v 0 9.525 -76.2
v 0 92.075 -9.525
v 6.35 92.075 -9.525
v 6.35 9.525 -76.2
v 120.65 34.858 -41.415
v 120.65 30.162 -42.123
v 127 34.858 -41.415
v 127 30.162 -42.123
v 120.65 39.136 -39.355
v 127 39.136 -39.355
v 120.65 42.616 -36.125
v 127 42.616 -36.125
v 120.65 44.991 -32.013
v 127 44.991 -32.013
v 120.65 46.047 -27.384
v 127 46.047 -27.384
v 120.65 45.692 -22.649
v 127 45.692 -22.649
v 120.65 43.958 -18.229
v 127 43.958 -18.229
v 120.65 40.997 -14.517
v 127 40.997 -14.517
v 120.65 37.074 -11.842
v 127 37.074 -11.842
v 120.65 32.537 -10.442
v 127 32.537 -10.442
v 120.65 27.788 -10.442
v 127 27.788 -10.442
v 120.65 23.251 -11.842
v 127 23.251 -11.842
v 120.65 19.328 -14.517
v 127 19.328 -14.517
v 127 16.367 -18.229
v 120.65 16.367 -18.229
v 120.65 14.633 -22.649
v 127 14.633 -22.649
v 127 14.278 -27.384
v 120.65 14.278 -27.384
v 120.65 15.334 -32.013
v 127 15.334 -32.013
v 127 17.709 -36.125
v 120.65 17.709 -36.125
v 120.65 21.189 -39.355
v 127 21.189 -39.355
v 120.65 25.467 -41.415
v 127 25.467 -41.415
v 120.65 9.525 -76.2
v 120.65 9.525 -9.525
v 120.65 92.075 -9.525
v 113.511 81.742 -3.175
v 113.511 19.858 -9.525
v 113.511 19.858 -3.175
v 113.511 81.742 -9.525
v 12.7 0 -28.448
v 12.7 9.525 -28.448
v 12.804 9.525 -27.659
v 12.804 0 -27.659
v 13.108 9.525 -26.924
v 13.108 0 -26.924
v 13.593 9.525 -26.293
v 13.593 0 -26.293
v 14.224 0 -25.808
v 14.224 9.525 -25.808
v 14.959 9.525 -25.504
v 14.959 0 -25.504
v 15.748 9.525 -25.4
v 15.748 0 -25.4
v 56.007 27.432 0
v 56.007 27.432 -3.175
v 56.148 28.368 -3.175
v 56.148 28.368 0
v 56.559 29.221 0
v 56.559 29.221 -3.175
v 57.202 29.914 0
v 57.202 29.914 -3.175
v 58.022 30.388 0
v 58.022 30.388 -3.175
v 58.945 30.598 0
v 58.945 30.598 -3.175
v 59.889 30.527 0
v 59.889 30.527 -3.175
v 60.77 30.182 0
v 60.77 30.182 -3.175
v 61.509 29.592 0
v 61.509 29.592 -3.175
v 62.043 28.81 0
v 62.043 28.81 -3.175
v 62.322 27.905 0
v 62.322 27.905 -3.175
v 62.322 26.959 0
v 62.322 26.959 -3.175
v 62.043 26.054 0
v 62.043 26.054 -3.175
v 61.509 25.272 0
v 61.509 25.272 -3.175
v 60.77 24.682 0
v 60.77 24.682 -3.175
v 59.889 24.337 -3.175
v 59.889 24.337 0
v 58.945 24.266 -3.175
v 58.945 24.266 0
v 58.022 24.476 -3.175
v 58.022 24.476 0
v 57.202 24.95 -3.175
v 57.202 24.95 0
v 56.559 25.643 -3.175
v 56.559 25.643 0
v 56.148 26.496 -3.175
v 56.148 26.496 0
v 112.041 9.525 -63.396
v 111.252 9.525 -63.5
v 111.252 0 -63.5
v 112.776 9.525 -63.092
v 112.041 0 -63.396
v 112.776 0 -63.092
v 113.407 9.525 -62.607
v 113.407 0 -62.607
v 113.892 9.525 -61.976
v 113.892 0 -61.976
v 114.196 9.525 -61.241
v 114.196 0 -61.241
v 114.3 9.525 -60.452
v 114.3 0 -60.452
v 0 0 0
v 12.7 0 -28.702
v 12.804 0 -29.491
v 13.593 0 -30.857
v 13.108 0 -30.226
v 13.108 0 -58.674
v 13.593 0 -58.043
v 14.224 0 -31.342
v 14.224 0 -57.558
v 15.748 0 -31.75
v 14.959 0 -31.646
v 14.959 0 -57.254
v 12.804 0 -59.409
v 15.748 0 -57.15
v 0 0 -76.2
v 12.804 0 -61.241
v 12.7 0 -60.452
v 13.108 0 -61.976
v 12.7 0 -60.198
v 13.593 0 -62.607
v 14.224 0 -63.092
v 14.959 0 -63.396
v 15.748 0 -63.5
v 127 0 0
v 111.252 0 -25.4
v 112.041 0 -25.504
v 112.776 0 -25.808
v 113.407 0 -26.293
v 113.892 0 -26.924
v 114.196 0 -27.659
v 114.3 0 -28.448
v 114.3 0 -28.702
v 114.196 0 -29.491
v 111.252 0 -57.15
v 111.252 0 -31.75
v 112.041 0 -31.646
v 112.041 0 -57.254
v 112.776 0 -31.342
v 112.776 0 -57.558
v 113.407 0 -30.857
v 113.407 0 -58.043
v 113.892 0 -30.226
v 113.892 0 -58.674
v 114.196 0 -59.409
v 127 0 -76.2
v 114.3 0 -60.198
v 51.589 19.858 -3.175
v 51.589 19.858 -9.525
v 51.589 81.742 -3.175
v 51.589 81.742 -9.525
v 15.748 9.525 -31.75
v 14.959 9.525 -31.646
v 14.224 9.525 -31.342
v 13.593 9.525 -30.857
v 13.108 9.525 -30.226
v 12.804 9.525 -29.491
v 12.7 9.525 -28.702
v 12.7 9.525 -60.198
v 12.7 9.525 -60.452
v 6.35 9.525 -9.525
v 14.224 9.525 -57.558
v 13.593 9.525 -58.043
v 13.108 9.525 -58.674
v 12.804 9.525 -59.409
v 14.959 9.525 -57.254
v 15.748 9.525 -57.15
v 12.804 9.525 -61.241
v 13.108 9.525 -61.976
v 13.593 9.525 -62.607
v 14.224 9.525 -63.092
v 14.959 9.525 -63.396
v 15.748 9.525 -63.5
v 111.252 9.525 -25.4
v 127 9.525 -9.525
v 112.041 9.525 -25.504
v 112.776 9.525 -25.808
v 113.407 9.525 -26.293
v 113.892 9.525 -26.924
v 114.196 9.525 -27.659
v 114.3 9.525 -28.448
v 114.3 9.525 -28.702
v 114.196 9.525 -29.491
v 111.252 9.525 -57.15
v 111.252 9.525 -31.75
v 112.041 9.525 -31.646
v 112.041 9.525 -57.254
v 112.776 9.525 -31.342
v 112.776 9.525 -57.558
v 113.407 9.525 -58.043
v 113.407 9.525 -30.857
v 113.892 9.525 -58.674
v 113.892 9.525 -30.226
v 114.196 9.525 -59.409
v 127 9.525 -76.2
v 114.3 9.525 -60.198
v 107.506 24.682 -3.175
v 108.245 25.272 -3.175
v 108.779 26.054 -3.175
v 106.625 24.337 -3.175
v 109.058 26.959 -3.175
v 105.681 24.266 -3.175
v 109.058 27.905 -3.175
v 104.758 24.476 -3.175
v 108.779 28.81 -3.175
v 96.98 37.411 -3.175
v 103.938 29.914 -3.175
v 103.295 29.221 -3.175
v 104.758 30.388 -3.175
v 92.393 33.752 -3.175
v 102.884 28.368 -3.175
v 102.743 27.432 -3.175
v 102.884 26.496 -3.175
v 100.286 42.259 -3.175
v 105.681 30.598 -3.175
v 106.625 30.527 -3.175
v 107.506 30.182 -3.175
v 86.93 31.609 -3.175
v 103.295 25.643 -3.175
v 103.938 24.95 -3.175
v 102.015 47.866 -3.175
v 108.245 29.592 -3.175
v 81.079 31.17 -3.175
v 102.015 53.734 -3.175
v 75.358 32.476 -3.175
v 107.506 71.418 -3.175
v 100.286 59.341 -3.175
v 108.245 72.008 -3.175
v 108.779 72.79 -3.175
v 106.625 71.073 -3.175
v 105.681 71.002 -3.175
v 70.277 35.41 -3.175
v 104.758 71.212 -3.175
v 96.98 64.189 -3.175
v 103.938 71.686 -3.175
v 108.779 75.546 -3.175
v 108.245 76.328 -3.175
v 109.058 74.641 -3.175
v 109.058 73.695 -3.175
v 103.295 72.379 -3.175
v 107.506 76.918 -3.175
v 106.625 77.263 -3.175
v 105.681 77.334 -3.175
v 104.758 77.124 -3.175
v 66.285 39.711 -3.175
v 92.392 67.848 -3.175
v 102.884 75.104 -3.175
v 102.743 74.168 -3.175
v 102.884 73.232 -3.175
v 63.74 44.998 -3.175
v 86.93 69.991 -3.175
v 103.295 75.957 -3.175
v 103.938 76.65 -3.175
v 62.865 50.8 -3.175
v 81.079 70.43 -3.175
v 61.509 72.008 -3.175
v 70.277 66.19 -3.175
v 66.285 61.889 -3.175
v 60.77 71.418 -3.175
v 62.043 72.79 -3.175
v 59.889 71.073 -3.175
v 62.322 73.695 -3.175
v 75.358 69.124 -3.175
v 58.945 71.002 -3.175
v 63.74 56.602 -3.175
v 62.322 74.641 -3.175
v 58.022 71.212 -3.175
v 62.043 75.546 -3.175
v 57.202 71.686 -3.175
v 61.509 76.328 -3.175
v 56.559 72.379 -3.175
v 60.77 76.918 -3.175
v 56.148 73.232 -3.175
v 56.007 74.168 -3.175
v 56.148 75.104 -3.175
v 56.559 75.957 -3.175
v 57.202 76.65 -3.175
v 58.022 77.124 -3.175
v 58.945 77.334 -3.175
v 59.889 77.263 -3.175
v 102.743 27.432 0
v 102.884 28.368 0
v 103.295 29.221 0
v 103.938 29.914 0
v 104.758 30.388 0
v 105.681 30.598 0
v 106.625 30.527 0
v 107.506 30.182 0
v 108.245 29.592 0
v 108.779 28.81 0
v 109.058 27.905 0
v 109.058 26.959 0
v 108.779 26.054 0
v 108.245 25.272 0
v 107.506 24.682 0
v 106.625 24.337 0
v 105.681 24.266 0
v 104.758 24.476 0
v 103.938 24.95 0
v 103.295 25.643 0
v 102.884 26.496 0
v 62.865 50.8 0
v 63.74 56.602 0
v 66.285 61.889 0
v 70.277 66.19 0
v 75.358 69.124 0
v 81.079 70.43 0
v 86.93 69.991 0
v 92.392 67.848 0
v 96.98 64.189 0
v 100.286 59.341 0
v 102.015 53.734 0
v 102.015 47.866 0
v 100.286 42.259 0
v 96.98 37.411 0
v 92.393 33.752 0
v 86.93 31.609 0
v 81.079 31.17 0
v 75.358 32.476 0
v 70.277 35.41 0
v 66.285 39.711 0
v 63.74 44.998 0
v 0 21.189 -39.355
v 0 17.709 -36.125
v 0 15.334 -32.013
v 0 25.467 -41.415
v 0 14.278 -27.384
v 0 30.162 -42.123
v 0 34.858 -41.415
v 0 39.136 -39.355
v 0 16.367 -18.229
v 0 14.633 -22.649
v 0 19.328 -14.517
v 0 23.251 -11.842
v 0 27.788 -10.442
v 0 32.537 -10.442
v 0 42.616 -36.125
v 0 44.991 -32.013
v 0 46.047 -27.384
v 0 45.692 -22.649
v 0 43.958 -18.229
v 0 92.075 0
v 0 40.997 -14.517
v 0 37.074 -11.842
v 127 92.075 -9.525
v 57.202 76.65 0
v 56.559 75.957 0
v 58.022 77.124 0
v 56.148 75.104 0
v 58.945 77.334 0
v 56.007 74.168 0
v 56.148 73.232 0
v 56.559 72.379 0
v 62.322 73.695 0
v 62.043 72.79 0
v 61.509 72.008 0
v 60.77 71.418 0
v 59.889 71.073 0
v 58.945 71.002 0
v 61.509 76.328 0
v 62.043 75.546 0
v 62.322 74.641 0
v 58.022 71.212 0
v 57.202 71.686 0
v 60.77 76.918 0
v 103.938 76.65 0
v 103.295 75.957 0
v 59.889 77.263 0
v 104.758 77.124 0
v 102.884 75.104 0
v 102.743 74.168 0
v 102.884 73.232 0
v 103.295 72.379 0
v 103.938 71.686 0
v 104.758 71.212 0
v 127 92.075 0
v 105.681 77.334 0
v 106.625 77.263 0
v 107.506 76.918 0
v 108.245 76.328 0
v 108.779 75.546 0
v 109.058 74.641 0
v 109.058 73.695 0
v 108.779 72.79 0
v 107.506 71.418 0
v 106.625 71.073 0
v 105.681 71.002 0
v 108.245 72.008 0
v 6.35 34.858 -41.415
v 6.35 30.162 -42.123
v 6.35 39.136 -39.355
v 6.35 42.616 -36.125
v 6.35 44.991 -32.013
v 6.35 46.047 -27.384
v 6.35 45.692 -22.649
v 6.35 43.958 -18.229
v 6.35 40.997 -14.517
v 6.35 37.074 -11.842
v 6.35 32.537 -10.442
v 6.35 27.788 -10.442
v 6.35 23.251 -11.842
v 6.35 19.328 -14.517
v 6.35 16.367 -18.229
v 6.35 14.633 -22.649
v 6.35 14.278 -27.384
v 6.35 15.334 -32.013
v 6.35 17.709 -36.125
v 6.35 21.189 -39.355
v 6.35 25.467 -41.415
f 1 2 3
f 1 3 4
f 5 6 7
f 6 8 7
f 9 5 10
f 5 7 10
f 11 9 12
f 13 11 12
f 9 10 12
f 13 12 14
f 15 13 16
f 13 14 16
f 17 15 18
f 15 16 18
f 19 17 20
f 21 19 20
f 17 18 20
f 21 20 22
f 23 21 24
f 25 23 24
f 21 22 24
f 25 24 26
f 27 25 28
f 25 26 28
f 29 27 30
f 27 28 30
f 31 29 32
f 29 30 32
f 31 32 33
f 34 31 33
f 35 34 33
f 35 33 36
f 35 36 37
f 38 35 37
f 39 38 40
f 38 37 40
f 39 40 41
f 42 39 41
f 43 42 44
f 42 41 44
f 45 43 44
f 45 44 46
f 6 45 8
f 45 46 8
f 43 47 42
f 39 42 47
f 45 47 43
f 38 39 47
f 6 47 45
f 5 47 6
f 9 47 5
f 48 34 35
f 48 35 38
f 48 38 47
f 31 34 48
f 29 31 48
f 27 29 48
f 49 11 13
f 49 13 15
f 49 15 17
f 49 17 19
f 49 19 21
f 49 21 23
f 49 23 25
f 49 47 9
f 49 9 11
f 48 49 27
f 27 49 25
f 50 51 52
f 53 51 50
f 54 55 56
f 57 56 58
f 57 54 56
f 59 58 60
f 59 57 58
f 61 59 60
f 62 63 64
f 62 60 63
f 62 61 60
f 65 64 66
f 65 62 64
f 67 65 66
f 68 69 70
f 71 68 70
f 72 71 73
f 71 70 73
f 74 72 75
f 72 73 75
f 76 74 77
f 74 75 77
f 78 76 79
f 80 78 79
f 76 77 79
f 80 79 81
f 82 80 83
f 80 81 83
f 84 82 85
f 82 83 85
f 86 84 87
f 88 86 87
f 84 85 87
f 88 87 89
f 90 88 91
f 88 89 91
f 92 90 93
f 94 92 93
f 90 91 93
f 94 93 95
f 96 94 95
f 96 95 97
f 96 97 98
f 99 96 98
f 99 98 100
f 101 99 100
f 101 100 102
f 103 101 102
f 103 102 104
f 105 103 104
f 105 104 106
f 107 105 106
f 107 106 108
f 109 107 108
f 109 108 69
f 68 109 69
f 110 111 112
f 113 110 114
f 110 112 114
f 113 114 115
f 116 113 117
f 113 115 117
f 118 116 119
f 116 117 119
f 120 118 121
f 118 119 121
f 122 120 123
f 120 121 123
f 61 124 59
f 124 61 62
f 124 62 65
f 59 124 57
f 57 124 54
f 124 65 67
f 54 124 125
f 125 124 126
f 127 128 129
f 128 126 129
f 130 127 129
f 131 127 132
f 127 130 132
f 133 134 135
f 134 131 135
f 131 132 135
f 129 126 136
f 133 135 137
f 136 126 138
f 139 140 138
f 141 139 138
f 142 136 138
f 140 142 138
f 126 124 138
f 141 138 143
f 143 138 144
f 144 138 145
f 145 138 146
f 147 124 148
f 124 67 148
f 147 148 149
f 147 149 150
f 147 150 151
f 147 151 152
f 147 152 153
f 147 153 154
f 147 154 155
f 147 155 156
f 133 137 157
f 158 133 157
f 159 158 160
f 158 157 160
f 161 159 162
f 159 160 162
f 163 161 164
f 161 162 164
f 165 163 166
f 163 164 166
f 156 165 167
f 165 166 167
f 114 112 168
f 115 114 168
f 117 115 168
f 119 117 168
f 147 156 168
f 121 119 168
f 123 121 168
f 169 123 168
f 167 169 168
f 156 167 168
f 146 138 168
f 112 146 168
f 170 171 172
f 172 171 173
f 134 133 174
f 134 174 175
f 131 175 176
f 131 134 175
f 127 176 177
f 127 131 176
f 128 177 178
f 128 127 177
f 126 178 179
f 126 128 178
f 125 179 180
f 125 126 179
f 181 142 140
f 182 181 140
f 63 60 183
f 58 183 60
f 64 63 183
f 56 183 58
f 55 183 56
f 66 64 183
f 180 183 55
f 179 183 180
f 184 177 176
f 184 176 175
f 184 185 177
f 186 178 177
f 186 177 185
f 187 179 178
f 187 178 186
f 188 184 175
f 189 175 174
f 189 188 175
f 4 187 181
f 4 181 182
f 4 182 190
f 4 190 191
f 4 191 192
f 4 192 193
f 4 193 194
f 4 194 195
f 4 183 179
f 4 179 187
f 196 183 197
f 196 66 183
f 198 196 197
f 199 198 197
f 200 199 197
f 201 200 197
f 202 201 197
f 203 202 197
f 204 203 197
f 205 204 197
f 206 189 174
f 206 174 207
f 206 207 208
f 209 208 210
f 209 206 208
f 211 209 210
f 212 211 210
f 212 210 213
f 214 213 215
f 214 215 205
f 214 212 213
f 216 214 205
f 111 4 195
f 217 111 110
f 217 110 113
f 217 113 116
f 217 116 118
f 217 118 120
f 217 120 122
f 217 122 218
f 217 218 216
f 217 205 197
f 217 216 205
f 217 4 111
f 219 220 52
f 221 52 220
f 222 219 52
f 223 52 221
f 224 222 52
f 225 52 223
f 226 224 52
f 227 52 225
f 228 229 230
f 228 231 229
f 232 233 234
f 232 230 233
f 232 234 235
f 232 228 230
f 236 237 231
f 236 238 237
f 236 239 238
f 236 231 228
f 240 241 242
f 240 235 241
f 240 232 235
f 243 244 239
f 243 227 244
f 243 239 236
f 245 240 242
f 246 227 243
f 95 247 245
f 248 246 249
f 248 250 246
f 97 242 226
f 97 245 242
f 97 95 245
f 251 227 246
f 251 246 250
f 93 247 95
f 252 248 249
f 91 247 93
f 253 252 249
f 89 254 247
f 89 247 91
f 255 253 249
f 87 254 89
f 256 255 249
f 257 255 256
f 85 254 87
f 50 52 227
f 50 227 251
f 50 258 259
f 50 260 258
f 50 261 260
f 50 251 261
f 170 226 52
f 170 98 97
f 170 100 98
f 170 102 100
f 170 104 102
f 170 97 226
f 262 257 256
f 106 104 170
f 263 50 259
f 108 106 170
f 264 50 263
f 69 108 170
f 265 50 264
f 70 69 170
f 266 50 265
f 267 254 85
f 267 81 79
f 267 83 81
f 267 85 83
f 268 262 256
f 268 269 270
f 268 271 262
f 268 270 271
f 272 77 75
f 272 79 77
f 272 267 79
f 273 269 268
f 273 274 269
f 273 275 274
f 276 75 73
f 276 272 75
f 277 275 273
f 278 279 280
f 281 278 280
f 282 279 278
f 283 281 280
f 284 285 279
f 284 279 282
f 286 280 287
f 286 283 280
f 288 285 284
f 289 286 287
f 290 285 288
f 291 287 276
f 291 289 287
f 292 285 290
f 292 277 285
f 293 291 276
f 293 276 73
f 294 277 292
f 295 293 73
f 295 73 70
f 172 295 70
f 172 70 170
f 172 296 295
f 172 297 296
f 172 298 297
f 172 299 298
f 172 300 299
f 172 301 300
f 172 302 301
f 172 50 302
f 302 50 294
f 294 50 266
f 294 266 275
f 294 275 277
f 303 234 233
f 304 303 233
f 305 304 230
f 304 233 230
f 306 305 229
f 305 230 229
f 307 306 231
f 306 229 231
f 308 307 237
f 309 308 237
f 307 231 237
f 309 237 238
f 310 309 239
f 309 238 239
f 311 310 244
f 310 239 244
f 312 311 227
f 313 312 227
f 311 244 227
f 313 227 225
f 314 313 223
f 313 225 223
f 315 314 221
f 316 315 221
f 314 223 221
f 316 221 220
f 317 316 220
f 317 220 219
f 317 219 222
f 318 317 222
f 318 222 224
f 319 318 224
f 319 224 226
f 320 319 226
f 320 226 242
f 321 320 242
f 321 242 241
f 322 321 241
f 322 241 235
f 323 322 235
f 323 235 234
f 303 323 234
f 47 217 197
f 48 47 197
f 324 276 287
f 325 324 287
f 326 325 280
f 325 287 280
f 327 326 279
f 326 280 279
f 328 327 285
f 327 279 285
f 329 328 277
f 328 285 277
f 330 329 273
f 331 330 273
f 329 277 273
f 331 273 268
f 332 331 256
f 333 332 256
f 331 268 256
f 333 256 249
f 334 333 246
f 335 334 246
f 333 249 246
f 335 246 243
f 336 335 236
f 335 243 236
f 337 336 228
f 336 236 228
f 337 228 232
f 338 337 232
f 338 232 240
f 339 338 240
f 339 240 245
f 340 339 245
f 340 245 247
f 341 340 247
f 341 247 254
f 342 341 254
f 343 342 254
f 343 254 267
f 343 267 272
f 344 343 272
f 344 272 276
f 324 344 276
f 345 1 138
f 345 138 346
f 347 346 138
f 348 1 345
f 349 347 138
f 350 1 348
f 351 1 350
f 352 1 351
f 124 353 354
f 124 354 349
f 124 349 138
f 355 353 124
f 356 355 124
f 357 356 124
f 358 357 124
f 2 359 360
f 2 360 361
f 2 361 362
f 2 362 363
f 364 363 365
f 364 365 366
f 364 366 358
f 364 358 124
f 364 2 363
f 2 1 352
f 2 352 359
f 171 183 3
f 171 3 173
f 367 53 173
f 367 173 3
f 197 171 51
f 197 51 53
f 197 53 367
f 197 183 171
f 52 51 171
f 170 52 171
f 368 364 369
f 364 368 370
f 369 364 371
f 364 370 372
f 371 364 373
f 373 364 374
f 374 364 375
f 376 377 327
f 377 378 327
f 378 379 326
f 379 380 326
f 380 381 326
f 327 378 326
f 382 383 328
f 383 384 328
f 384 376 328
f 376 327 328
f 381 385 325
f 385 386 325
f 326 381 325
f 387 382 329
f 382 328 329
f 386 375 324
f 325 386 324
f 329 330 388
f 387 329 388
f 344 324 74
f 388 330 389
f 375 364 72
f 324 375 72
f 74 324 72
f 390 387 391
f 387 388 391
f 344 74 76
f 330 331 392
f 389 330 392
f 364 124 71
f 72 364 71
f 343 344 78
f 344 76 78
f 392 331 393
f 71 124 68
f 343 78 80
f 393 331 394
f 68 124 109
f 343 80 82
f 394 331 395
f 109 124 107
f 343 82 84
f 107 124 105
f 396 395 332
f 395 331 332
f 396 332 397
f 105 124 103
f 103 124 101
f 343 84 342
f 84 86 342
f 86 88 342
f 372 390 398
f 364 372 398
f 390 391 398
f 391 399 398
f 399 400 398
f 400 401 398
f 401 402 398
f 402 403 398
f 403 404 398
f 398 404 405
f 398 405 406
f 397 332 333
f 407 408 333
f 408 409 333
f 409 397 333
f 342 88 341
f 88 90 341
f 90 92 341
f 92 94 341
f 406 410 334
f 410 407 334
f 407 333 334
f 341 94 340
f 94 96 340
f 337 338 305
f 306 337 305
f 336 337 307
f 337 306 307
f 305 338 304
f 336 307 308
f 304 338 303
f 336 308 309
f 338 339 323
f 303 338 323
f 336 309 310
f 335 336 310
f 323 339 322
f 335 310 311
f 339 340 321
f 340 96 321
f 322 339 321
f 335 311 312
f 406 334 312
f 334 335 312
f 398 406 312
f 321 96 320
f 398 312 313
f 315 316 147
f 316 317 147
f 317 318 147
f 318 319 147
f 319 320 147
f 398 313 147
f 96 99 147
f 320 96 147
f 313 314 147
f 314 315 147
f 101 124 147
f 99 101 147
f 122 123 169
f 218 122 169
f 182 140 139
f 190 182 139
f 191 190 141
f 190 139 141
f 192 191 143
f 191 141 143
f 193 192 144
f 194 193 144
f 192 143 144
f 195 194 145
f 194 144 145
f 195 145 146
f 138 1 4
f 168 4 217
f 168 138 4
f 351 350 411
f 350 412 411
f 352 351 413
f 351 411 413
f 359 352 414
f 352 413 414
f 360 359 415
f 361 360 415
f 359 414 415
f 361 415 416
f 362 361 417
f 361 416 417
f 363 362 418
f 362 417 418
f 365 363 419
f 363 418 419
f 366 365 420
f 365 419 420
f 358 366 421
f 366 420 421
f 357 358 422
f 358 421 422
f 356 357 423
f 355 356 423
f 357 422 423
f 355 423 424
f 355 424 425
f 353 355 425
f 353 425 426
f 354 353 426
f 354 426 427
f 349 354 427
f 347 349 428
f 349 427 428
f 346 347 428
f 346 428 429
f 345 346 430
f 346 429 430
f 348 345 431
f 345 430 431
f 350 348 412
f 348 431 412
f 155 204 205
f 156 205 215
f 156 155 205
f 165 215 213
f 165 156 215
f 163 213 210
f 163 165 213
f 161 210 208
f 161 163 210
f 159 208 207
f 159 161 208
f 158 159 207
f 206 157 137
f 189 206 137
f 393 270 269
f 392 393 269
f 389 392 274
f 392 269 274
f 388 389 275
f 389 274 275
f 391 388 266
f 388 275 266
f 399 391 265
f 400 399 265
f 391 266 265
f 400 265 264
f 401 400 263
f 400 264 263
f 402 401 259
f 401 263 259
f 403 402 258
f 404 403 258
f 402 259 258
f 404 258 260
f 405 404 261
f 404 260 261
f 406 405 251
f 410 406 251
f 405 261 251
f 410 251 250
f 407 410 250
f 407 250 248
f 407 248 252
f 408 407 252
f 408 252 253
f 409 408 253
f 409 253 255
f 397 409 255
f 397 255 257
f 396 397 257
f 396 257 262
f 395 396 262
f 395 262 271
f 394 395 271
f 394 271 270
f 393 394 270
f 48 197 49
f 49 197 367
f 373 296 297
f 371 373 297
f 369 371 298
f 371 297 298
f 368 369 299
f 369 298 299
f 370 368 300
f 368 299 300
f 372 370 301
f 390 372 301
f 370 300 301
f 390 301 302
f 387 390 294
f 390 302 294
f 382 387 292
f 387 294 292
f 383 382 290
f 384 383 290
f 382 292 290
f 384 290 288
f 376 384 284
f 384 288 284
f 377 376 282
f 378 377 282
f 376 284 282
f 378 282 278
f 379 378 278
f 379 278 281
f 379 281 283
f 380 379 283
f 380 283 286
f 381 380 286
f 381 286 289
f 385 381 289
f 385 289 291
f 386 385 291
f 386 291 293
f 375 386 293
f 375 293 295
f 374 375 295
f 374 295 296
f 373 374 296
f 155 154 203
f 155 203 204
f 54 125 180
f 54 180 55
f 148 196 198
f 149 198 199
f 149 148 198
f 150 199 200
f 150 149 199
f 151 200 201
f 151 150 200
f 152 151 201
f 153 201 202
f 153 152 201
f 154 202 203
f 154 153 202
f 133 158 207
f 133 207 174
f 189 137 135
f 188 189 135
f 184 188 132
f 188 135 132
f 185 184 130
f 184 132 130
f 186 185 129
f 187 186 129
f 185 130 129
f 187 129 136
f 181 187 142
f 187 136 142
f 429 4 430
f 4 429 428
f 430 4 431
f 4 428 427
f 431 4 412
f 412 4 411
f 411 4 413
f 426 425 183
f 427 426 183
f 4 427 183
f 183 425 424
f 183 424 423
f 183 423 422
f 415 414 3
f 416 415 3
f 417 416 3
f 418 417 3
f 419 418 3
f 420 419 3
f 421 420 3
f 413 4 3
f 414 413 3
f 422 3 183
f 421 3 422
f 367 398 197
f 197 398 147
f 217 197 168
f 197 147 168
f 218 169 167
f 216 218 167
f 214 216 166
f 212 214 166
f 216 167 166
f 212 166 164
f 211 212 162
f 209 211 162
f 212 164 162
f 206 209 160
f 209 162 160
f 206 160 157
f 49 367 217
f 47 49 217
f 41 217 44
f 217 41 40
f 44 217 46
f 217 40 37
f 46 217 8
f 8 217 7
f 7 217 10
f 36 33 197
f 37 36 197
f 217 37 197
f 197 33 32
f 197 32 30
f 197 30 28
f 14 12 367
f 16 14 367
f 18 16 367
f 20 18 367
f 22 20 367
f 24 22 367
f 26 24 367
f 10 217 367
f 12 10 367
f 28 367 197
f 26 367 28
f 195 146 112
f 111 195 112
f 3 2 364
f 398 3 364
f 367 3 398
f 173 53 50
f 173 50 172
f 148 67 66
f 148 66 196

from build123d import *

# Parameters (mm, degrees)
SKETCH2_W               = 127
SKETCH2_H               = 76.2
BOSS_EXTRUDE1_DEPTH     = 9.525
SKETCH3_W               = 127
SKETCH3_H               = 9.525
BOSS_EXTRUDE2_DEPTH     = 82.55
BOSS_EXTRUDE3_DEPTH     = 6.35
BOSS_EXTRUDE4_DEPTH     = 6.35
SKETCH7_R               = 19.685
SKETCH7_R_2             = 3.175
CUT_EXTRUDE1_DEPTH      = 10.525
SKETCH11_W              = 61.921486798
SKETCH11_H              = 61.884587426
CUT_EXTRUDE4_DEPTH      = 6.35
CUT_EXTRUDE5_DEPTH      = 93.075
SKETCH13_R              = 15.929247536
CUT_EXTRUDE6_DEPTH      = 121.65
CUT_EXTRUDE6_DEPTH_BACK = 7.35


with BuildPart() as part:
    # Sketch2 → Boss-Extrude1 (new body)
    with BuildSketch(Plane(origin=(0, 0, 0), x_dir=(1, 0, 0), z_dir=(0, 1, 0))):
        with Locations((63.5, 38.1)):
            Rectangle(SKETCH2_W, SKETCH2_H)
    extrude(amount=BOSS_EXTRUDE1_DEPTH)

    # Sketch3 → Boss-Extrude2 (add)
    with BuildSketch(Plane(origin=(0, 9.525, 0), x_dir=(1, 0, 0), z_dir=(0, 1, 0))):
        with Locations((63.5, 4.7625)):
            Rectangle(SKETCH3_W, SKETCH3_H)
    extrude(amount=BOSS_EXTRUDE2_DEPTH)

    # Sketch5 → Boss-Extrude4 (add)
    with BuildSketch(Plane.ZY):
        Polygon((-9.525, 92.075), (-76.2, 9.525), (-9.525, 9.525), align=None)
    extrude(amount=-BOSS_EXTRUDE4_DEPTH)

    # Sketch7 → Cut-Extrude1 (cut, through all)
    with BuildSketch(Plane(origin=(0, 0, -9.525), x_dir=(-1, 0, 0), z_dir=(0, 0, -1))):
        with Locations((-82.55, 50.8)):
            Circle(SKETCH7_R)
        with Locations((-105.918, 74.168)):
            Circle(SKETCH7_R_2)
        with Locations((-59.182, 74.168)):
            Circle(SKETCH7_R_2)
        with Locations((-59.182, 27.432)):
            Circle(SKETCH7_R_2)
        with Locations((-105.918, 27.432)):
            Circle(SKETCH7_R_2)
    extrude(amount=-CUT_EXTRUDE1_DEPTH, mode=Mode.SUBTRACT)

    # Sketch11 → Cut-Extrude4 (cut)
    with BuildSketch(Plane(origin=(0, 0, -9.525), x_dir=(-1, 0, 0), z_dir=(0, 0, -1))):
        with Locations((-82.55, 50.8)):
            Rectangle(SKETCH11_W, SKETCH11_H)
    extrude(amount=-CUT_EXTRUDE4_DEPTH, mode=Mode.SUBTRACT)

    # Sketch12 → Cut-Extrude5 (cut, through all)
    with BuildSketch(Plane.XZ):
        with BuildLine():
            Line((15.748, -63.5), (111.252, -63.5))
            ThreePointArc((111.252, -63.5), (113.407261469, -62.607261469), (114.3, -60.452))
            Line((114.3, -60.452), (114.3, -60.198))
            ThreePointArc((114.3, -60.198), (113.407261469, -58.042738531), (111.252, -57.15))
            Line((111.252, -57.15), (15.748, -57.15))
            ThreePointArc((15.748, -57.15), (13.592738531, -58.042738531), (12.7, -60.198))
            Line((12.7, -60.198), (12.7, -60.452))
            ThreePointArc((12.7, -60.452), (13.592738531, -62.607261469), (15.748, -63.5))
        make_face()
        with BuildLine():
            Line((15.748, -25.4), (111.252, -25.4))
            ThreePointArc((111.252, -25.4), (113.407261469, -26.292738531), (114.3, -28.448))
            Line((114.3, -28.448), (114.3, -28.702))
            ThreePointArc((114.3, -28.702), (113.407261469, -30.857261469), (111.252, -31.75))
            Line((111.252, -31.75), (15.748, -31.75))
            ThreePointArc((15.748, -31.75), (13.592738531, -30.857261469), (12.7, -28.702))
            Line((12.7, -28.702), (12.7, -28.448))
            ThreePointArc((12.7, -28.448), (13.592738531, -26.292738531), (15.748, -25.4))
        make_face()
    extrude(amount=-CUT_EXTRUDE5_DEPTH, mode=Mode.SUBTRACT)


with BuildPart() as body_2:
    # Sketch4 → Boss-Extrude3 (new body)
    with BuildSketch(Plane(origin=(127, 0, 0), x_dir=(0, 0, -1), z_dir=(1, 0, 0))):
        Polygon((9.525, 92.075), (76.2, 9.525), (9.525, 9.525), align=None)
    extrude(amount=-BOSS_EXTRUDE3_DEPTH)


with BuildPart() as cut_extrude6_tool:
    # Sketch13 → Cut-Extrude6 (new body, two sides)
    with BuildSketch(Plane(origin=(6.35, 0, 0), x_dir=(0, 0, -1), z_dir=(1, 0, 0))) as cut_extrude6_sk:
        with Locations((26.19375, 30.1625)):
            Circle(SKETCH13_R)
    extrude(amount=CUT_EXTRUDE6_DEPTH)
    extrude(cut_extrude6_sk.sketch, amount=-CUT_EXTRUDE6_DEPTH_BACK)


with BuildPart() as part_1:
    add(part.part)

    # Cut-Extrude6: cut by cut_extrude6_tool
    add(cut_extrude6_tool.part, mode=Mode.SUBTRACT)


with BuildPart() as body_2_1:
    add(body_2.part)

    # Cut-Extrude6: cut by cut_extrude6_tool
    add(cut_extrude6_tool.part, mode=Mode.SUBTRACT)


solid = Compound([part_1.part, body_2_1.part])
